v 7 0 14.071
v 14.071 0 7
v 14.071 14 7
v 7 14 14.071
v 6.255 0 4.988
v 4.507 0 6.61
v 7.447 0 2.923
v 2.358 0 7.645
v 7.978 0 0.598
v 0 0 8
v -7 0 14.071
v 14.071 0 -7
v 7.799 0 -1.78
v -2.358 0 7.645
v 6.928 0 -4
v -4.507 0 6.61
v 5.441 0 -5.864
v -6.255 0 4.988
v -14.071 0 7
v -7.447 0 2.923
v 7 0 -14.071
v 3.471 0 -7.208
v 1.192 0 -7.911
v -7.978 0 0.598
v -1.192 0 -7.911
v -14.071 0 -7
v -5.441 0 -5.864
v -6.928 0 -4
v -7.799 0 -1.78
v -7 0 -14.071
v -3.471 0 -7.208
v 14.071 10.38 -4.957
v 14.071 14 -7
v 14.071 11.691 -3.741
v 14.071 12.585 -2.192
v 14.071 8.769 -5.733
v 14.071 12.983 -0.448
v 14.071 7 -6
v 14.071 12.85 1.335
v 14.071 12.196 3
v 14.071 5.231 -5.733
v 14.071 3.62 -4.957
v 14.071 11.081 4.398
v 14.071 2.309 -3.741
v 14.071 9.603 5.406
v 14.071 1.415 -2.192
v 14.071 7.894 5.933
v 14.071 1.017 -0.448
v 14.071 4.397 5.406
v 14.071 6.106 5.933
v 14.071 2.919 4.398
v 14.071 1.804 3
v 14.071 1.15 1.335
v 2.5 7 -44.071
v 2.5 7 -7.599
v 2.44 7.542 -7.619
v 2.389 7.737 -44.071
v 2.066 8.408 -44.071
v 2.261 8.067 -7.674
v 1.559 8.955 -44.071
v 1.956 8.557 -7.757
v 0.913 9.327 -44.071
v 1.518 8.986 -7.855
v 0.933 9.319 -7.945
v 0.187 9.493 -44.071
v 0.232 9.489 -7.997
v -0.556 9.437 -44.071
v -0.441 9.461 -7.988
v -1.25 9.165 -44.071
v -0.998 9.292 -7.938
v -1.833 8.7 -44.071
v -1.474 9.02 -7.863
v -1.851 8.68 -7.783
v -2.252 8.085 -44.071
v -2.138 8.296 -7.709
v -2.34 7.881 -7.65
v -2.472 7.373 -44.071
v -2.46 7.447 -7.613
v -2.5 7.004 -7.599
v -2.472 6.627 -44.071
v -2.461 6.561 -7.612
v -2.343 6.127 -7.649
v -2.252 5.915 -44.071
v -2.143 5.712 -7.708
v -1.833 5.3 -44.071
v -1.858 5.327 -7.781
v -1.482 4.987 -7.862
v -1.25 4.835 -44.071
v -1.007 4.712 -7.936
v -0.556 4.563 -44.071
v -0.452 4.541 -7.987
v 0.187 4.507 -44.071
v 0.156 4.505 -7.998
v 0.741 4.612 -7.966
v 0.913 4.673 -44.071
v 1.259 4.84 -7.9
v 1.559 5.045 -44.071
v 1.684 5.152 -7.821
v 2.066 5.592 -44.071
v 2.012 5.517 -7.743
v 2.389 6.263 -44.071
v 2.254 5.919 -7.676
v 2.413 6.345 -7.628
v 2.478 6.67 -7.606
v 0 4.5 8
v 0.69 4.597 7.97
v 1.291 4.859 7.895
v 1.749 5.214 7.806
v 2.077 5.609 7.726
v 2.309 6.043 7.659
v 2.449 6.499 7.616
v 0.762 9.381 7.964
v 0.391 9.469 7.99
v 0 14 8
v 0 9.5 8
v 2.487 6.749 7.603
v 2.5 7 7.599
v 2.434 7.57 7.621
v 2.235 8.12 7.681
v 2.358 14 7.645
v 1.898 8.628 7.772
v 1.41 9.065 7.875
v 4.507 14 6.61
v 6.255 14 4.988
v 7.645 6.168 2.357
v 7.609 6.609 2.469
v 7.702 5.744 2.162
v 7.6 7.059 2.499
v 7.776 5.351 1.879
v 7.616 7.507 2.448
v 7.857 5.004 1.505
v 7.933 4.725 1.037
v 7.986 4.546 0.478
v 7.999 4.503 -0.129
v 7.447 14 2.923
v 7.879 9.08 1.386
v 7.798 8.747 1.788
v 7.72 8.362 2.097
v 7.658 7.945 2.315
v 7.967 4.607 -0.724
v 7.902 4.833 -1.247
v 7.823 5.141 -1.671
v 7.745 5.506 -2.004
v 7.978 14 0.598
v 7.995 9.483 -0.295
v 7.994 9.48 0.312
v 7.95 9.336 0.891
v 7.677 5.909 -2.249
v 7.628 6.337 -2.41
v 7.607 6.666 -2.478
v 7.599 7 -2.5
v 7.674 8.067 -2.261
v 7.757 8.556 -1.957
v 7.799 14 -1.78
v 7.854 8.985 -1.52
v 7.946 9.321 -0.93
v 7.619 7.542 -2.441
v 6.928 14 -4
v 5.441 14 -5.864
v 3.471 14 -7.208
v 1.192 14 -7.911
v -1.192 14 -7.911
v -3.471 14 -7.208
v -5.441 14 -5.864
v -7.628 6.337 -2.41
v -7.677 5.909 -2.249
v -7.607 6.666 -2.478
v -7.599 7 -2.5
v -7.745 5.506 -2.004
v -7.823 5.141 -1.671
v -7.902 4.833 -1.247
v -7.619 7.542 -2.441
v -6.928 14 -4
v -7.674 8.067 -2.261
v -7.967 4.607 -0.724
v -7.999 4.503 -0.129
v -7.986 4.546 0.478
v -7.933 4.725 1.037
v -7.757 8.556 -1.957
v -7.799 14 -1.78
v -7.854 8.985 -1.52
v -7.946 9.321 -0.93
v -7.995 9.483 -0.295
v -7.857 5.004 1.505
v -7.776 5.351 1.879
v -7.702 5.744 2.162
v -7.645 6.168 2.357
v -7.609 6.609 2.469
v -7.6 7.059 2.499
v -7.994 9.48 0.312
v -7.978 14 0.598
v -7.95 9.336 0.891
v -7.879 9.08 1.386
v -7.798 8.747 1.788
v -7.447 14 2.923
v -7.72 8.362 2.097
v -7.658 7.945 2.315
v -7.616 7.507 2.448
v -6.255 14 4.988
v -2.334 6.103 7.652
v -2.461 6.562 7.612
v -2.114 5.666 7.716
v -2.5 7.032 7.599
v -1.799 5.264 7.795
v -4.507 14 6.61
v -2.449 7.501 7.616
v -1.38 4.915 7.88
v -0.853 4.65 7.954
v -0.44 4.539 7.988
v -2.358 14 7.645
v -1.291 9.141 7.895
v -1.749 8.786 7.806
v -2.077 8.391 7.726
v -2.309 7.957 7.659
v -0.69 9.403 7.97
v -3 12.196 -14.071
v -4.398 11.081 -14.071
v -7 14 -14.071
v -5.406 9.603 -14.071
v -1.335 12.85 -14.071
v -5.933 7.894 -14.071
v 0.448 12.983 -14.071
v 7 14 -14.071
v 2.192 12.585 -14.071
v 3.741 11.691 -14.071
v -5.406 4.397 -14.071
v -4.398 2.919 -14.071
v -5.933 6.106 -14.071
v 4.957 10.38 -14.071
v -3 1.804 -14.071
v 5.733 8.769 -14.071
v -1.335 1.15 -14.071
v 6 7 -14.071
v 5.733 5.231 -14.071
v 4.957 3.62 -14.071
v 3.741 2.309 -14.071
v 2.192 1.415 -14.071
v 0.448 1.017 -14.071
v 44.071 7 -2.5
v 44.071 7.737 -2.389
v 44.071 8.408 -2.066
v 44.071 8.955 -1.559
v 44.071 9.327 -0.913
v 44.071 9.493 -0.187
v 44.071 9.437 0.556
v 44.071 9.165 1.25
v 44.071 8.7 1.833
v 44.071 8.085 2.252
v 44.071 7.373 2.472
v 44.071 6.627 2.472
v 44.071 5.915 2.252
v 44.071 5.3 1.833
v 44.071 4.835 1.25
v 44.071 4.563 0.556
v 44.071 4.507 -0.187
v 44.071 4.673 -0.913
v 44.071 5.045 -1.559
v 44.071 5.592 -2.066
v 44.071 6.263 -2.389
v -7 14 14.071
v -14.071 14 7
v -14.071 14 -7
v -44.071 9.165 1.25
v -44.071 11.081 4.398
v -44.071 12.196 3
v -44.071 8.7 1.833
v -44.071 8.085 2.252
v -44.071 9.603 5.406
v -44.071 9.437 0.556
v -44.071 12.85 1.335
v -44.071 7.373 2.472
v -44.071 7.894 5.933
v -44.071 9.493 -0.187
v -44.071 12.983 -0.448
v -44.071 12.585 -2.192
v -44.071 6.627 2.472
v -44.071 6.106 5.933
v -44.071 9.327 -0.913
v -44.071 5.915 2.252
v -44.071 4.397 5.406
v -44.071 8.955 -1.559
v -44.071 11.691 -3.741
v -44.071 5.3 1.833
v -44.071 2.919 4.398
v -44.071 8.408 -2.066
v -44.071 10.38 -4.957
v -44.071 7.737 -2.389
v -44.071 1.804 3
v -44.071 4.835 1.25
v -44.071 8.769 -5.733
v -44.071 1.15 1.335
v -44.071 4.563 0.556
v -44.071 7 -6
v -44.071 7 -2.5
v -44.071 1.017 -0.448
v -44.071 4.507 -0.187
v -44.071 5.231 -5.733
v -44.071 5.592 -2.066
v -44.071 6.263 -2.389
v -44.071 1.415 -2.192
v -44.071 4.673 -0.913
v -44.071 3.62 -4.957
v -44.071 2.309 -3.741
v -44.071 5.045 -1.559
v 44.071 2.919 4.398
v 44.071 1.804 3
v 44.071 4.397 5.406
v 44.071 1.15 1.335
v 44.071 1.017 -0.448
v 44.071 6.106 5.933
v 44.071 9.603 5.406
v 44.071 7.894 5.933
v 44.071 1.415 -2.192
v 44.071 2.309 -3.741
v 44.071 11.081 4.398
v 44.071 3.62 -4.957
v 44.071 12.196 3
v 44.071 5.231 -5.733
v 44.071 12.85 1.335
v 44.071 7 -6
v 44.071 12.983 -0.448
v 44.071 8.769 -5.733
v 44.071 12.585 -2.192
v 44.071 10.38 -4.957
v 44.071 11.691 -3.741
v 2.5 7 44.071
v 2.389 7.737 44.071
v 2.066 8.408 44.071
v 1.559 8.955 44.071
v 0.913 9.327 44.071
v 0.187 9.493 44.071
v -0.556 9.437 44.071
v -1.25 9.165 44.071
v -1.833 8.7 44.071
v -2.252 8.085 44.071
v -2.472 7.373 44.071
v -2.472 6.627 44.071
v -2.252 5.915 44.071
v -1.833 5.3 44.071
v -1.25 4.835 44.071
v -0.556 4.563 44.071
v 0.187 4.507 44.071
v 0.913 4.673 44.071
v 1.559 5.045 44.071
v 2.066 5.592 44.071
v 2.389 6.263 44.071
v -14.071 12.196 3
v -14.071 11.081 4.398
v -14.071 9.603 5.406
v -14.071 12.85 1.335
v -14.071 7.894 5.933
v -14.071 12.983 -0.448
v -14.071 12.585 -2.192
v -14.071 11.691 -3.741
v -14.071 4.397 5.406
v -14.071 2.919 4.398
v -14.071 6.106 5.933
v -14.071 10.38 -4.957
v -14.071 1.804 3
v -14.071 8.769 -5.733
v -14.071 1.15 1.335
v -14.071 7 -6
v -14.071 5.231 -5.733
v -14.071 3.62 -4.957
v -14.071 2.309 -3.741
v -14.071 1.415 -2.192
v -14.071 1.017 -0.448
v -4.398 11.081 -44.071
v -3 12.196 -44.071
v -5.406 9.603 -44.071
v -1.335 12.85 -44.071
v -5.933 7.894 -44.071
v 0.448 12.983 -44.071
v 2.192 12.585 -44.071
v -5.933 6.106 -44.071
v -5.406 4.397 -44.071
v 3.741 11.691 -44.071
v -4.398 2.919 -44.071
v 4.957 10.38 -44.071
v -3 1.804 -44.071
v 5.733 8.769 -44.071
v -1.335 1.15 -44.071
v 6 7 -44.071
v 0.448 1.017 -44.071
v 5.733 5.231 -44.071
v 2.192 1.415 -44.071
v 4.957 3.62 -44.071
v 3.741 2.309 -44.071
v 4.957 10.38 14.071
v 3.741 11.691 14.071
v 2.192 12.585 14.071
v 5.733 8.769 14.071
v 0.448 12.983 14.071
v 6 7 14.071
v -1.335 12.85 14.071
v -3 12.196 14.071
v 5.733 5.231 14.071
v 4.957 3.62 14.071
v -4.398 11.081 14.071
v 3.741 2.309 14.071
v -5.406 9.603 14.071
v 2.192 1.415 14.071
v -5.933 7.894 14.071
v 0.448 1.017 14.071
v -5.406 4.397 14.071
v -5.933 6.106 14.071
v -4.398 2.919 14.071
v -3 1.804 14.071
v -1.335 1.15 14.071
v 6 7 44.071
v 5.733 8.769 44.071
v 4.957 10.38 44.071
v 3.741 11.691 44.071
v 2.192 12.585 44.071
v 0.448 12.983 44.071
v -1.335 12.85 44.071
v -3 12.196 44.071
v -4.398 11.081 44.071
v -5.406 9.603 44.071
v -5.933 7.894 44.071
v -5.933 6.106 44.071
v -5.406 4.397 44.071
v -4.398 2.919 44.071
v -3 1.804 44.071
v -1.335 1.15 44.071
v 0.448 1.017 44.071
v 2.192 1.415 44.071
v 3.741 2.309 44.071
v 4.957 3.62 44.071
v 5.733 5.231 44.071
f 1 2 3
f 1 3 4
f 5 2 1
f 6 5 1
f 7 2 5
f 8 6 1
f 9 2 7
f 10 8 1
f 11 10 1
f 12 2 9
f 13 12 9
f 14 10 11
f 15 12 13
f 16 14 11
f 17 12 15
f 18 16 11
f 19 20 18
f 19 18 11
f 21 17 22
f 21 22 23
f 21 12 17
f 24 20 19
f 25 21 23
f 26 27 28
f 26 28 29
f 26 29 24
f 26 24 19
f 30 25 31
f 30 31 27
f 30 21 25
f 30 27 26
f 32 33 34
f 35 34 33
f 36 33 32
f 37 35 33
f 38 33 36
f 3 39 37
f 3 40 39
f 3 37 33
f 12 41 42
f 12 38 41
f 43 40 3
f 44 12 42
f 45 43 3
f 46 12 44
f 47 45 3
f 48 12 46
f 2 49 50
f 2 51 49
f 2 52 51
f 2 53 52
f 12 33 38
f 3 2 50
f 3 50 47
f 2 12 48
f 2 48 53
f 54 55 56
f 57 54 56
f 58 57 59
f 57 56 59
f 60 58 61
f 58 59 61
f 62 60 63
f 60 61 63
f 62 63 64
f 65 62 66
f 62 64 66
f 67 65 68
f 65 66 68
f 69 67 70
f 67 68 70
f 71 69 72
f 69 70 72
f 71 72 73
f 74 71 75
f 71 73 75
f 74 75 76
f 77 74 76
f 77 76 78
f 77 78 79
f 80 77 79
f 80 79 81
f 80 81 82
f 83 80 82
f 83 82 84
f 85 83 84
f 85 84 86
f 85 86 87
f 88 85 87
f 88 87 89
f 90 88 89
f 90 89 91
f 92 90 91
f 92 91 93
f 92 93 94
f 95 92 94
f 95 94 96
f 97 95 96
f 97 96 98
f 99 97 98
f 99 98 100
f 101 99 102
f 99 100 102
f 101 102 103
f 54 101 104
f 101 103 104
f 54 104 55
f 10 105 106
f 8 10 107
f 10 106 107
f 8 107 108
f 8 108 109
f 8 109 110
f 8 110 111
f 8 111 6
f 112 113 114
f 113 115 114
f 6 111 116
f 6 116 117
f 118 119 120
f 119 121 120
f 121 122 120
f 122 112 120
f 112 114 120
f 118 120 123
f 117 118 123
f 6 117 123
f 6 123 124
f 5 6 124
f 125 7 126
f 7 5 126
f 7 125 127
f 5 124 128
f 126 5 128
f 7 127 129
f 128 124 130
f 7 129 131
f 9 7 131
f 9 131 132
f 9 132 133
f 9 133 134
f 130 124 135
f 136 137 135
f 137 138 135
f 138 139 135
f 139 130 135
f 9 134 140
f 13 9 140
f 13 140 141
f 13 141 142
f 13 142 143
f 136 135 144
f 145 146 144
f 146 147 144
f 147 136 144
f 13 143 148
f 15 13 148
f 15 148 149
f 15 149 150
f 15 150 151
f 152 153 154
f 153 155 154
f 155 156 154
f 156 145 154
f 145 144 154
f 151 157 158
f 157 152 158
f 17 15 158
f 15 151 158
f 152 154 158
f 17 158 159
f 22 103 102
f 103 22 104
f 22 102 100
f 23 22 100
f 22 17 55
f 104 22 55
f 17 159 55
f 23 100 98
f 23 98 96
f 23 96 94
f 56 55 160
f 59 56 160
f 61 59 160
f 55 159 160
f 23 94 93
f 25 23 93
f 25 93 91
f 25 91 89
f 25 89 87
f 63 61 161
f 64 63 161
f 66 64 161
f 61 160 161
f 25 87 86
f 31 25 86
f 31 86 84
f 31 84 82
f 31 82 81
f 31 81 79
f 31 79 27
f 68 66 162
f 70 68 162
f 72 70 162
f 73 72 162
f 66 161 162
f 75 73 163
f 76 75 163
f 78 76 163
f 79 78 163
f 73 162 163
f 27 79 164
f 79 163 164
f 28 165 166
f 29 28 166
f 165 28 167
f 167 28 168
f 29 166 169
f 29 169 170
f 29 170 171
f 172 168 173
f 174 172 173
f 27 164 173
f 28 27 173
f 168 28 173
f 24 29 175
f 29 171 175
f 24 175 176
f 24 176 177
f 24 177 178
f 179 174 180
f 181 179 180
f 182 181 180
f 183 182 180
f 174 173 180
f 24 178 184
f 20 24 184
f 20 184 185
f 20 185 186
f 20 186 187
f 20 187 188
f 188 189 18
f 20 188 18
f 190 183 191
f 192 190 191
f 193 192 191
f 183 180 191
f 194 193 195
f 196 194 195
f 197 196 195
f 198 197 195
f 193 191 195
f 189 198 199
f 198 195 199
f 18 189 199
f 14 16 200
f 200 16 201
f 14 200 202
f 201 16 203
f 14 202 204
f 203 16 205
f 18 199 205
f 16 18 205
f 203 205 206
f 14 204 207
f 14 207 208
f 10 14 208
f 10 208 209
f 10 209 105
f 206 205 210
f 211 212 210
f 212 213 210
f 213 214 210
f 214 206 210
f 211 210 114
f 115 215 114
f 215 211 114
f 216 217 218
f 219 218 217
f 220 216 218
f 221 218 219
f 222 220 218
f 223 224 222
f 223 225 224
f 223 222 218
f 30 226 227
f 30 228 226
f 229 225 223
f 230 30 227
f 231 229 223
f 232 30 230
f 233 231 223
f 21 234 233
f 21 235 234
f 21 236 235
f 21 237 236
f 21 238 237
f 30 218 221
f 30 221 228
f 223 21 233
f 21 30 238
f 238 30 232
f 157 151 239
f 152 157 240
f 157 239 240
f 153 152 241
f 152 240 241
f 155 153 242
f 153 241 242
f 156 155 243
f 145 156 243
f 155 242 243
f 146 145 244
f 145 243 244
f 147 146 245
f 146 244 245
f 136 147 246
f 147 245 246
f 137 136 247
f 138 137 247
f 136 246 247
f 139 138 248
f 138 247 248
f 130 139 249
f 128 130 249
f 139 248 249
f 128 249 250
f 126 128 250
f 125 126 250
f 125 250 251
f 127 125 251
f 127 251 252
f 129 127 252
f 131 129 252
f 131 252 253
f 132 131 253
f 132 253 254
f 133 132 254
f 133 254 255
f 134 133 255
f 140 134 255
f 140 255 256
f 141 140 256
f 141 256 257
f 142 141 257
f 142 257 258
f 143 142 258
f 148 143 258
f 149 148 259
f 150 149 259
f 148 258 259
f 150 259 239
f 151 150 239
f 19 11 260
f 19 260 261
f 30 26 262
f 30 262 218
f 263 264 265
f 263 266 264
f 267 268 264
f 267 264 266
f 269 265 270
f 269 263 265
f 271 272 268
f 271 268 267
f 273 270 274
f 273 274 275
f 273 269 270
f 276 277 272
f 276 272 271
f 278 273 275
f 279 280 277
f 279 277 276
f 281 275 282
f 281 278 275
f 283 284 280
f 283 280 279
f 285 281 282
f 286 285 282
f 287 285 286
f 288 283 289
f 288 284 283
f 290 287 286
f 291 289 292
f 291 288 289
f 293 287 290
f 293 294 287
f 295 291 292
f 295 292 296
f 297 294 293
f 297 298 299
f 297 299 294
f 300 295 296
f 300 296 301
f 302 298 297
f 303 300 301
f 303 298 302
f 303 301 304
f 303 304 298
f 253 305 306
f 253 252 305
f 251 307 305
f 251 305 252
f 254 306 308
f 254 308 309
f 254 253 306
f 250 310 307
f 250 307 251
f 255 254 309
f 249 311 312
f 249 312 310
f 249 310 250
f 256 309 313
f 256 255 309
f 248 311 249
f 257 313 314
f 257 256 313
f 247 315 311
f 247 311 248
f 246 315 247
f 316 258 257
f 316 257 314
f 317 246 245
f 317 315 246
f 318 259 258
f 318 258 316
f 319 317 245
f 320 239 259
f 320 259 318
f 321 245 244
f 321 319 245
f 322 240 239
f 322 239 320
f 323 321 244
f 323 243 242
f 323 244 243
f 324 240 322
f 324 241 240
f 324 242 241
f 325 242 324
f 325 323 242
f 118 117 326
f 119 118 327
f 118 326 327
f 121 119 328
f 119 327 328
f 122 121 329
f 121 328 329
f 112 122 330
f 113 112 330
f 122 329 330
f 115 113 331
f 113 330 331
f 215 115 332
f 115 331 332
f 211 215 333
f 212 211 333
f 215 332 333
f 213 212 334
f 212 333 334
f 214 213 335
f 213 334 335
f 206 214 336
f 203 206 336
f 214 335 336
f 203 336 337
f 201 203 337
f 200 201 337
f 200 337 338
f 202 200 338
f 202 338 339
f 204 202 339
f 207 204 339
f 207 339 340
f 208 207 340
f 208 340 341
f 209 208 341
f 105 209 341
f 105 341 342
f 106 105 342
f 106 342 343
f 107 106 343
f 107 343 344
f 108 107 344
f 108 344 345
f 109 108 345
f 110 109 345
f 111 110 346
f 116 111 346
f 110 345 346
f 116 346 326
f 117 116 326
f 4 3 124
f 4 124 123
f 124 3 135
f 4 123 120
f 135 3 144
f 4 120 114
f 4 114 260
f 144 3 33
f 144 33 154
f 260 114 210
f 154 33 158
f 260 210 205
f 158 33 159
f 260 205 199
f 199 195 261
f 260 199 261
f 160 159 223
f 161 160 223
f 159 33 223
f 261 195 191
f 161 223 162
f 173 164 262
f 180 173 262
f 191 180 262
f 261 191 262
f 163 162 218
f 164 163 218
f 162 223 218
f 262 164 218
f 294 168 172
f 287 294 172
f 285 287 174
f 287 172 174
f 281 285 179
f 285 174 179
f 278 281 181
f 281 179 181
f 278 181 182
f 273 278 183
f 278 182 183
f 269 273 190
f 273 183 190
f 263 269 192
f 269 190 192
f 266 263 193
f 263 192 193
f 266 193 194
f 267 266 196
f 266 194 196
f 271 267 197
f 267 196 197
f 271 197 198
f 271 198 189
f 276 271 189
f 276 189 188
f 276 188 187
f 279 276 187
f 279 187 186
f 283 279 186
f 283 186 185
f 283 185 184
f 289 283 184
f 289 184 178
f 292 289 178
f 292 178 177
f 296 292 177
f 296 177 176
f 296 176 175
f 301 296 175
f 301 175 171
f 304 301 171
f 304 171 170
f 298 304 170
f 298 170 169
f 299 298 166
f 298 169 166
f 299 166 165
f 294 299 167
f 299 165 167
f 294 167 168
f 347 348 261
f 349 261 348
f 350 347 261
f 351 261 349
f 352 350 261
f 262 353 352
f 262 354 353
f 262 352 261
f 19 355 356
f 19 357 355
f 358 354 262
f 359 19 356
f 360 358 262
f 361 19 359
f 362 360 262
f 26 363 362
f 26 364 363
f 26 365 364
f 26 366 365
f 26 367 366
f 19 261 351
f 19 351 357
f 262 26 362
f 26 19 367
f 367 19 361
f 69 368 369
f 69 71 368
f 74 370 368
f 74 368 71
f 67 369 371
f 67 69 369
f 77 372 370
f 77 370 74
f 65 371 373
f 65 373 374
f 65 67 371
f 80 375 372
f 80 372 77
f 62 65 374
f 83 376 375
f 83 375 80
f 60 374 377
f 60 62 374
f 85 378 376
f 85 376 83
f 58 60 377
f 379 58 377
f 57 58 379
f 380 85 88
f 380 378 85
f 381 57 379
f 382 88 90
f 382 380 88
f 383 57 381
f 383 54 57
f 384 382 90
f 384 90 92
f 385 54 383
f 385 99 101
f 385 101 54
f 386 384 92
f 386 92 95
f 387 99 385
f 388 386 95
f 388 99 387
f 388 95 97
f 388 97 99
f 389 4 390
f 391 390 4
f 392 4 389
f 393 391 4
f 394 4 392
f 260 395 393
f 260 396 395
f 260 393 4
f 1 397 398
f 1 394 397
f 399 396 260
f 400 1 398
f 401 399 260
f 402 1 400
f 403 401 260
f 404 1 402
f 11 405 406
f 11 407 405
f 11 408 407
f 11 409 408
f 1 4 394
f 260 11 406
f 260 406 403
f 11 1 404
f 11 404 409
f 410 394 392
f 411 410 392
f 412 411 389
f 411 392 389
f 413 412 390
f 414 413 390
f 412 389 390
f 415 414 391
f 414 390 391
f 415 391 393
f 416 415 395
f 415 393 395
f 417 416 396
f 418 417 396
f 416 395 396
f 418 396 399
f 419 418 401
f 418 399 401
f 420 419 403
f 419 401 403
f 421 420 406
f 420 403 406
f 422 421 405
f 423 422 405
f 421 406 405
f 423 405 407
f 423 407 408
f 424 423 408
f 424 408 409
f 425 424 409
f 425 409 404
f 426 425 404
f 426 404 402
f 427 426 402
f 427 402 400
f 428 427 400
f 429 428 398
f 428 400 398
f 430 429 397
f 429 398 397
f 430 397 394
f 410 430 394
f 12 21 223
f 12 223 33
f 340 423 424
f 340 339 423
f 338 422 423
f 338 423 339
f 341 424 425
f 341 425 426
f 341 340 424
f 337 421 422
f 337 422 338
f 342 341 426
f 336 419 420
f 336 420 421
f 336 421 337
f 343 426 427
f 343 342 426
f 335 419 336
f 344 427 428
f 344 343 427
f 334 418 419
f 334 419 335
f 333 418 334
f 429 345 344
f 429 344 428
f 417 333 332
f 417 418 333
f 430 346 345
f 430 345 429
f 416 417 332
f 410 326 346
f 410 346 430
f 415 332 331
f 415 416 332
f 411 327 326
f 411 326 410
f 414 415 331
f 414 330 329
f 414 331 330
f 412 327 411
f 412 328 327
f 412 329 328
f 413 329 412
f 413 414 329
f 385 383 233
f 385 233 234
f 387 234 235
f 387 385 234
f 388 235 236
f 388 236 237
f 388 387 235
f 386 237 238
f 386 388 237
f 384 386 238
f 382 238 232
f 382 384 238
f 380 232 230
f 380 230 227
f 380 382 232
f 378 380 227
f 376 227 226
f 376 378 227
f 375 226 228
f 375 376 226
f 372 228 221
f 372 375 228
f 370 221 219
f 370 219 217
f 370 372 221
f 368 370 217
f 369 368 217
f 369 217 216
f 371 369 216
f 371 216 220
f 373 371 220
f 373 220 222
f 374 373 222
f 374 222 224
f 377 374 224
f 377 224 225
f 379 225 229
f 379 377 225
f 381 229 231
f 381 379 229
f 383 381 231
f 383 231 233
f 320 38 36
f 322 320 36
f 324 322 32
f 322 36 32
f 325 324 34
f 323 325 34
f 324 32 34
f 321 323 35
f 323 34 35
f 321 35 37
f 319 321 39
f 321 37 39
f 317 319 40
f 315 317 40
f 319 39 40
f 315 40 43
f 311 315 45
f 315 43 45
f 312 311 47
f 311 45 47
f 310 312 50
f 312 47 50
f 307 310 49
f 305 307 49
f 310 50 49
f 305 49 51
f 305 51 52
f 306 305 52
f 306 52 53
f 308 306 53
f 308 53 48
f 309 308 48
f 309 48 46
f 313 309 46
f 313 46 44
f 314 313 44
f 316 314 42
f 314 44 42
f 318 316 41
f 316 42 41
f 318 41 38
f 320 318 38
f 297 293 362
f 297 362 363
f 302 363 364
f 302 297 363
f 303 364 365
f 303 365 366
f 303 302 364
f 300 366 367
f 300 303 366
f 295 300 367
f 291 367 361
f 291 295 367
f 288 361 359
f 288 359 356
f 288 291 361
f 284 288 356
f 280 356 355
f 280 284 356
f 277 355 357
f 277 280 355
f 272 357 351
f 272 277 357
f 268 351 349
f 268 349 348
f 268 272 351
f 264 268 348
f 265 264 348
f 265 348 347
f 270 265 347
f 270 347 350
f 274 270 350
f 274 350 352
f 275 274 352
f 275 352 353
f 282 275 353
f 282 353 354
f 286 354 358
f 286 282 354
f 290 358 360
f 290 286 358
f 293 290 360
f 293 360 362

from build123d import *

# Parameters (mm, degrees)
HUB_DEPTH                         = 14
SKETCH4_R                         = 6
ARM_INSERT_1_DEPTH                = 30
SKETCH5_R                         = 6
ARM_INSERT_2_DEPTH                = 30
ARM_START                         = 30
SKETCH6_R                         = 6
ARM_INSERT_3_DEPTH                = 30
SKETCH7_R                         = 6
ARM_INSERT_4_DEPTH                = 30
SKETCH8_R                         = 8
HUB_LIGHTENING_HOLE_DEPTH         = 64.878932647
SKETCH9_R                         = 2.5
ARM_1_AND_3_LIGHTENING_HOLE_DEPTH = 100.535396168
SKETCH10_R                        = 2.5
ARM_2_AND_4_LIGHTENING_HOLE_DEPTH = 100.535396227


with BuildPart() as part:
    # Sketch1 → Hub (new body)
    with BuildSketch(Plane(origin=(0, 0, 0), x_dir=(1, 0, 0), z_dir=(0, 1, 0))):
        Polygon((14.071067812, 7), (14.071067812, -7), (7, -14.071067812), (-7, -14.071067812), (-14.071067812, -7), (-14.071067812, 7), (-7, 14.071067812), (7, 14.071067812), align=None)
    extrude(amount=HUB_DEPTH)

    # Sketch4 → Arm Insert 1 (add)
    with BuildSketch(Plane.XY.offset(14.071067812)):
        with Locations((0, 7)):
            Circle(SKETCH4_R)
    extrude(amount=ARM_INSERT_1_DEPTH)

    # Sketch5 → Arm Insert 2 (add)
    with BuildSketch(Plane(origin=(14.071067812, 0, 0), x_dir=(0, 0, -1), z_dir=(1, 0, 0))):
        with Locations((0, 7)):
            Circle(SKETCH5_R)
    extrude(amount=ARM_INSERT_2_DEPTH)

    # Sketch6 → Arm Insert 3 (add)
    with BuildSketch(Plane(origin=(0, 0, -14.071067812), x_dir=(-1, 0, 0), z_dir=(0, 0, -1)).offset(ARM_START)):
        with Locations(Location((0, 7, 0), (0, 0, 180))):
            Circle(SKETCH6_R)
    extrude(amount=-ARM_INSERT_3_DEPTH)

    # Sketch7 → Arm Insert 4 (add)
    with BuildSketch(Plane.ZY.offset(14.071067812).offset(ARM_START)):
        with Locations(Location((0, 7, 0), (0, 0, 180))):
            Circle(SKETCH7_R)
    extrude(amount=-ARM_INSERT_4_DEPTH)

    # Sketch8 → Hub Lightening Hole (cut, through all)
    with BuildSketch(Plane(origin=(0, 14, 0), x_dir=(1, 0, 0), z_dir=(0, 1, 0))):
        with Locations(Location((0, 0, 0), (0, 0, 270))):
            Circle(SKETCH8_R)
    extrude(amount=-HUB_LIGHTENING_HOLE_DEPTH, mode=Mode.SUBTRACT)

    # Sketch9 → Arm 1 and 3 Lightening Hole (cut, through all)
    with BuildSketch(Plane.XY.offset(44.071067812)):
        with Locations((0, 7)):
            Circle(SKETCH9_R)
    extrude(amount=-ARM_1_AND_3_LIGHTENING_HOLE_DEPTH, mode=Mode.SUBTRACT)

    # Sketch10 → Arm 2 and 4 Lightening Hole (cut, through all)
    with BuildSketch(Plane(origin=(44.071067812, 0, 0), x_dir=(0, 0, -1), z_dir=(1, 0, 0))):
        with Locations((0, 7)):
            Circle(SKETCH10_R)
    extrude(amount=-ARM_2_AND_4_LIGHTENING_HOLE_DEPTH, mode=Mode.SUBTRACT)


solid = part.part
